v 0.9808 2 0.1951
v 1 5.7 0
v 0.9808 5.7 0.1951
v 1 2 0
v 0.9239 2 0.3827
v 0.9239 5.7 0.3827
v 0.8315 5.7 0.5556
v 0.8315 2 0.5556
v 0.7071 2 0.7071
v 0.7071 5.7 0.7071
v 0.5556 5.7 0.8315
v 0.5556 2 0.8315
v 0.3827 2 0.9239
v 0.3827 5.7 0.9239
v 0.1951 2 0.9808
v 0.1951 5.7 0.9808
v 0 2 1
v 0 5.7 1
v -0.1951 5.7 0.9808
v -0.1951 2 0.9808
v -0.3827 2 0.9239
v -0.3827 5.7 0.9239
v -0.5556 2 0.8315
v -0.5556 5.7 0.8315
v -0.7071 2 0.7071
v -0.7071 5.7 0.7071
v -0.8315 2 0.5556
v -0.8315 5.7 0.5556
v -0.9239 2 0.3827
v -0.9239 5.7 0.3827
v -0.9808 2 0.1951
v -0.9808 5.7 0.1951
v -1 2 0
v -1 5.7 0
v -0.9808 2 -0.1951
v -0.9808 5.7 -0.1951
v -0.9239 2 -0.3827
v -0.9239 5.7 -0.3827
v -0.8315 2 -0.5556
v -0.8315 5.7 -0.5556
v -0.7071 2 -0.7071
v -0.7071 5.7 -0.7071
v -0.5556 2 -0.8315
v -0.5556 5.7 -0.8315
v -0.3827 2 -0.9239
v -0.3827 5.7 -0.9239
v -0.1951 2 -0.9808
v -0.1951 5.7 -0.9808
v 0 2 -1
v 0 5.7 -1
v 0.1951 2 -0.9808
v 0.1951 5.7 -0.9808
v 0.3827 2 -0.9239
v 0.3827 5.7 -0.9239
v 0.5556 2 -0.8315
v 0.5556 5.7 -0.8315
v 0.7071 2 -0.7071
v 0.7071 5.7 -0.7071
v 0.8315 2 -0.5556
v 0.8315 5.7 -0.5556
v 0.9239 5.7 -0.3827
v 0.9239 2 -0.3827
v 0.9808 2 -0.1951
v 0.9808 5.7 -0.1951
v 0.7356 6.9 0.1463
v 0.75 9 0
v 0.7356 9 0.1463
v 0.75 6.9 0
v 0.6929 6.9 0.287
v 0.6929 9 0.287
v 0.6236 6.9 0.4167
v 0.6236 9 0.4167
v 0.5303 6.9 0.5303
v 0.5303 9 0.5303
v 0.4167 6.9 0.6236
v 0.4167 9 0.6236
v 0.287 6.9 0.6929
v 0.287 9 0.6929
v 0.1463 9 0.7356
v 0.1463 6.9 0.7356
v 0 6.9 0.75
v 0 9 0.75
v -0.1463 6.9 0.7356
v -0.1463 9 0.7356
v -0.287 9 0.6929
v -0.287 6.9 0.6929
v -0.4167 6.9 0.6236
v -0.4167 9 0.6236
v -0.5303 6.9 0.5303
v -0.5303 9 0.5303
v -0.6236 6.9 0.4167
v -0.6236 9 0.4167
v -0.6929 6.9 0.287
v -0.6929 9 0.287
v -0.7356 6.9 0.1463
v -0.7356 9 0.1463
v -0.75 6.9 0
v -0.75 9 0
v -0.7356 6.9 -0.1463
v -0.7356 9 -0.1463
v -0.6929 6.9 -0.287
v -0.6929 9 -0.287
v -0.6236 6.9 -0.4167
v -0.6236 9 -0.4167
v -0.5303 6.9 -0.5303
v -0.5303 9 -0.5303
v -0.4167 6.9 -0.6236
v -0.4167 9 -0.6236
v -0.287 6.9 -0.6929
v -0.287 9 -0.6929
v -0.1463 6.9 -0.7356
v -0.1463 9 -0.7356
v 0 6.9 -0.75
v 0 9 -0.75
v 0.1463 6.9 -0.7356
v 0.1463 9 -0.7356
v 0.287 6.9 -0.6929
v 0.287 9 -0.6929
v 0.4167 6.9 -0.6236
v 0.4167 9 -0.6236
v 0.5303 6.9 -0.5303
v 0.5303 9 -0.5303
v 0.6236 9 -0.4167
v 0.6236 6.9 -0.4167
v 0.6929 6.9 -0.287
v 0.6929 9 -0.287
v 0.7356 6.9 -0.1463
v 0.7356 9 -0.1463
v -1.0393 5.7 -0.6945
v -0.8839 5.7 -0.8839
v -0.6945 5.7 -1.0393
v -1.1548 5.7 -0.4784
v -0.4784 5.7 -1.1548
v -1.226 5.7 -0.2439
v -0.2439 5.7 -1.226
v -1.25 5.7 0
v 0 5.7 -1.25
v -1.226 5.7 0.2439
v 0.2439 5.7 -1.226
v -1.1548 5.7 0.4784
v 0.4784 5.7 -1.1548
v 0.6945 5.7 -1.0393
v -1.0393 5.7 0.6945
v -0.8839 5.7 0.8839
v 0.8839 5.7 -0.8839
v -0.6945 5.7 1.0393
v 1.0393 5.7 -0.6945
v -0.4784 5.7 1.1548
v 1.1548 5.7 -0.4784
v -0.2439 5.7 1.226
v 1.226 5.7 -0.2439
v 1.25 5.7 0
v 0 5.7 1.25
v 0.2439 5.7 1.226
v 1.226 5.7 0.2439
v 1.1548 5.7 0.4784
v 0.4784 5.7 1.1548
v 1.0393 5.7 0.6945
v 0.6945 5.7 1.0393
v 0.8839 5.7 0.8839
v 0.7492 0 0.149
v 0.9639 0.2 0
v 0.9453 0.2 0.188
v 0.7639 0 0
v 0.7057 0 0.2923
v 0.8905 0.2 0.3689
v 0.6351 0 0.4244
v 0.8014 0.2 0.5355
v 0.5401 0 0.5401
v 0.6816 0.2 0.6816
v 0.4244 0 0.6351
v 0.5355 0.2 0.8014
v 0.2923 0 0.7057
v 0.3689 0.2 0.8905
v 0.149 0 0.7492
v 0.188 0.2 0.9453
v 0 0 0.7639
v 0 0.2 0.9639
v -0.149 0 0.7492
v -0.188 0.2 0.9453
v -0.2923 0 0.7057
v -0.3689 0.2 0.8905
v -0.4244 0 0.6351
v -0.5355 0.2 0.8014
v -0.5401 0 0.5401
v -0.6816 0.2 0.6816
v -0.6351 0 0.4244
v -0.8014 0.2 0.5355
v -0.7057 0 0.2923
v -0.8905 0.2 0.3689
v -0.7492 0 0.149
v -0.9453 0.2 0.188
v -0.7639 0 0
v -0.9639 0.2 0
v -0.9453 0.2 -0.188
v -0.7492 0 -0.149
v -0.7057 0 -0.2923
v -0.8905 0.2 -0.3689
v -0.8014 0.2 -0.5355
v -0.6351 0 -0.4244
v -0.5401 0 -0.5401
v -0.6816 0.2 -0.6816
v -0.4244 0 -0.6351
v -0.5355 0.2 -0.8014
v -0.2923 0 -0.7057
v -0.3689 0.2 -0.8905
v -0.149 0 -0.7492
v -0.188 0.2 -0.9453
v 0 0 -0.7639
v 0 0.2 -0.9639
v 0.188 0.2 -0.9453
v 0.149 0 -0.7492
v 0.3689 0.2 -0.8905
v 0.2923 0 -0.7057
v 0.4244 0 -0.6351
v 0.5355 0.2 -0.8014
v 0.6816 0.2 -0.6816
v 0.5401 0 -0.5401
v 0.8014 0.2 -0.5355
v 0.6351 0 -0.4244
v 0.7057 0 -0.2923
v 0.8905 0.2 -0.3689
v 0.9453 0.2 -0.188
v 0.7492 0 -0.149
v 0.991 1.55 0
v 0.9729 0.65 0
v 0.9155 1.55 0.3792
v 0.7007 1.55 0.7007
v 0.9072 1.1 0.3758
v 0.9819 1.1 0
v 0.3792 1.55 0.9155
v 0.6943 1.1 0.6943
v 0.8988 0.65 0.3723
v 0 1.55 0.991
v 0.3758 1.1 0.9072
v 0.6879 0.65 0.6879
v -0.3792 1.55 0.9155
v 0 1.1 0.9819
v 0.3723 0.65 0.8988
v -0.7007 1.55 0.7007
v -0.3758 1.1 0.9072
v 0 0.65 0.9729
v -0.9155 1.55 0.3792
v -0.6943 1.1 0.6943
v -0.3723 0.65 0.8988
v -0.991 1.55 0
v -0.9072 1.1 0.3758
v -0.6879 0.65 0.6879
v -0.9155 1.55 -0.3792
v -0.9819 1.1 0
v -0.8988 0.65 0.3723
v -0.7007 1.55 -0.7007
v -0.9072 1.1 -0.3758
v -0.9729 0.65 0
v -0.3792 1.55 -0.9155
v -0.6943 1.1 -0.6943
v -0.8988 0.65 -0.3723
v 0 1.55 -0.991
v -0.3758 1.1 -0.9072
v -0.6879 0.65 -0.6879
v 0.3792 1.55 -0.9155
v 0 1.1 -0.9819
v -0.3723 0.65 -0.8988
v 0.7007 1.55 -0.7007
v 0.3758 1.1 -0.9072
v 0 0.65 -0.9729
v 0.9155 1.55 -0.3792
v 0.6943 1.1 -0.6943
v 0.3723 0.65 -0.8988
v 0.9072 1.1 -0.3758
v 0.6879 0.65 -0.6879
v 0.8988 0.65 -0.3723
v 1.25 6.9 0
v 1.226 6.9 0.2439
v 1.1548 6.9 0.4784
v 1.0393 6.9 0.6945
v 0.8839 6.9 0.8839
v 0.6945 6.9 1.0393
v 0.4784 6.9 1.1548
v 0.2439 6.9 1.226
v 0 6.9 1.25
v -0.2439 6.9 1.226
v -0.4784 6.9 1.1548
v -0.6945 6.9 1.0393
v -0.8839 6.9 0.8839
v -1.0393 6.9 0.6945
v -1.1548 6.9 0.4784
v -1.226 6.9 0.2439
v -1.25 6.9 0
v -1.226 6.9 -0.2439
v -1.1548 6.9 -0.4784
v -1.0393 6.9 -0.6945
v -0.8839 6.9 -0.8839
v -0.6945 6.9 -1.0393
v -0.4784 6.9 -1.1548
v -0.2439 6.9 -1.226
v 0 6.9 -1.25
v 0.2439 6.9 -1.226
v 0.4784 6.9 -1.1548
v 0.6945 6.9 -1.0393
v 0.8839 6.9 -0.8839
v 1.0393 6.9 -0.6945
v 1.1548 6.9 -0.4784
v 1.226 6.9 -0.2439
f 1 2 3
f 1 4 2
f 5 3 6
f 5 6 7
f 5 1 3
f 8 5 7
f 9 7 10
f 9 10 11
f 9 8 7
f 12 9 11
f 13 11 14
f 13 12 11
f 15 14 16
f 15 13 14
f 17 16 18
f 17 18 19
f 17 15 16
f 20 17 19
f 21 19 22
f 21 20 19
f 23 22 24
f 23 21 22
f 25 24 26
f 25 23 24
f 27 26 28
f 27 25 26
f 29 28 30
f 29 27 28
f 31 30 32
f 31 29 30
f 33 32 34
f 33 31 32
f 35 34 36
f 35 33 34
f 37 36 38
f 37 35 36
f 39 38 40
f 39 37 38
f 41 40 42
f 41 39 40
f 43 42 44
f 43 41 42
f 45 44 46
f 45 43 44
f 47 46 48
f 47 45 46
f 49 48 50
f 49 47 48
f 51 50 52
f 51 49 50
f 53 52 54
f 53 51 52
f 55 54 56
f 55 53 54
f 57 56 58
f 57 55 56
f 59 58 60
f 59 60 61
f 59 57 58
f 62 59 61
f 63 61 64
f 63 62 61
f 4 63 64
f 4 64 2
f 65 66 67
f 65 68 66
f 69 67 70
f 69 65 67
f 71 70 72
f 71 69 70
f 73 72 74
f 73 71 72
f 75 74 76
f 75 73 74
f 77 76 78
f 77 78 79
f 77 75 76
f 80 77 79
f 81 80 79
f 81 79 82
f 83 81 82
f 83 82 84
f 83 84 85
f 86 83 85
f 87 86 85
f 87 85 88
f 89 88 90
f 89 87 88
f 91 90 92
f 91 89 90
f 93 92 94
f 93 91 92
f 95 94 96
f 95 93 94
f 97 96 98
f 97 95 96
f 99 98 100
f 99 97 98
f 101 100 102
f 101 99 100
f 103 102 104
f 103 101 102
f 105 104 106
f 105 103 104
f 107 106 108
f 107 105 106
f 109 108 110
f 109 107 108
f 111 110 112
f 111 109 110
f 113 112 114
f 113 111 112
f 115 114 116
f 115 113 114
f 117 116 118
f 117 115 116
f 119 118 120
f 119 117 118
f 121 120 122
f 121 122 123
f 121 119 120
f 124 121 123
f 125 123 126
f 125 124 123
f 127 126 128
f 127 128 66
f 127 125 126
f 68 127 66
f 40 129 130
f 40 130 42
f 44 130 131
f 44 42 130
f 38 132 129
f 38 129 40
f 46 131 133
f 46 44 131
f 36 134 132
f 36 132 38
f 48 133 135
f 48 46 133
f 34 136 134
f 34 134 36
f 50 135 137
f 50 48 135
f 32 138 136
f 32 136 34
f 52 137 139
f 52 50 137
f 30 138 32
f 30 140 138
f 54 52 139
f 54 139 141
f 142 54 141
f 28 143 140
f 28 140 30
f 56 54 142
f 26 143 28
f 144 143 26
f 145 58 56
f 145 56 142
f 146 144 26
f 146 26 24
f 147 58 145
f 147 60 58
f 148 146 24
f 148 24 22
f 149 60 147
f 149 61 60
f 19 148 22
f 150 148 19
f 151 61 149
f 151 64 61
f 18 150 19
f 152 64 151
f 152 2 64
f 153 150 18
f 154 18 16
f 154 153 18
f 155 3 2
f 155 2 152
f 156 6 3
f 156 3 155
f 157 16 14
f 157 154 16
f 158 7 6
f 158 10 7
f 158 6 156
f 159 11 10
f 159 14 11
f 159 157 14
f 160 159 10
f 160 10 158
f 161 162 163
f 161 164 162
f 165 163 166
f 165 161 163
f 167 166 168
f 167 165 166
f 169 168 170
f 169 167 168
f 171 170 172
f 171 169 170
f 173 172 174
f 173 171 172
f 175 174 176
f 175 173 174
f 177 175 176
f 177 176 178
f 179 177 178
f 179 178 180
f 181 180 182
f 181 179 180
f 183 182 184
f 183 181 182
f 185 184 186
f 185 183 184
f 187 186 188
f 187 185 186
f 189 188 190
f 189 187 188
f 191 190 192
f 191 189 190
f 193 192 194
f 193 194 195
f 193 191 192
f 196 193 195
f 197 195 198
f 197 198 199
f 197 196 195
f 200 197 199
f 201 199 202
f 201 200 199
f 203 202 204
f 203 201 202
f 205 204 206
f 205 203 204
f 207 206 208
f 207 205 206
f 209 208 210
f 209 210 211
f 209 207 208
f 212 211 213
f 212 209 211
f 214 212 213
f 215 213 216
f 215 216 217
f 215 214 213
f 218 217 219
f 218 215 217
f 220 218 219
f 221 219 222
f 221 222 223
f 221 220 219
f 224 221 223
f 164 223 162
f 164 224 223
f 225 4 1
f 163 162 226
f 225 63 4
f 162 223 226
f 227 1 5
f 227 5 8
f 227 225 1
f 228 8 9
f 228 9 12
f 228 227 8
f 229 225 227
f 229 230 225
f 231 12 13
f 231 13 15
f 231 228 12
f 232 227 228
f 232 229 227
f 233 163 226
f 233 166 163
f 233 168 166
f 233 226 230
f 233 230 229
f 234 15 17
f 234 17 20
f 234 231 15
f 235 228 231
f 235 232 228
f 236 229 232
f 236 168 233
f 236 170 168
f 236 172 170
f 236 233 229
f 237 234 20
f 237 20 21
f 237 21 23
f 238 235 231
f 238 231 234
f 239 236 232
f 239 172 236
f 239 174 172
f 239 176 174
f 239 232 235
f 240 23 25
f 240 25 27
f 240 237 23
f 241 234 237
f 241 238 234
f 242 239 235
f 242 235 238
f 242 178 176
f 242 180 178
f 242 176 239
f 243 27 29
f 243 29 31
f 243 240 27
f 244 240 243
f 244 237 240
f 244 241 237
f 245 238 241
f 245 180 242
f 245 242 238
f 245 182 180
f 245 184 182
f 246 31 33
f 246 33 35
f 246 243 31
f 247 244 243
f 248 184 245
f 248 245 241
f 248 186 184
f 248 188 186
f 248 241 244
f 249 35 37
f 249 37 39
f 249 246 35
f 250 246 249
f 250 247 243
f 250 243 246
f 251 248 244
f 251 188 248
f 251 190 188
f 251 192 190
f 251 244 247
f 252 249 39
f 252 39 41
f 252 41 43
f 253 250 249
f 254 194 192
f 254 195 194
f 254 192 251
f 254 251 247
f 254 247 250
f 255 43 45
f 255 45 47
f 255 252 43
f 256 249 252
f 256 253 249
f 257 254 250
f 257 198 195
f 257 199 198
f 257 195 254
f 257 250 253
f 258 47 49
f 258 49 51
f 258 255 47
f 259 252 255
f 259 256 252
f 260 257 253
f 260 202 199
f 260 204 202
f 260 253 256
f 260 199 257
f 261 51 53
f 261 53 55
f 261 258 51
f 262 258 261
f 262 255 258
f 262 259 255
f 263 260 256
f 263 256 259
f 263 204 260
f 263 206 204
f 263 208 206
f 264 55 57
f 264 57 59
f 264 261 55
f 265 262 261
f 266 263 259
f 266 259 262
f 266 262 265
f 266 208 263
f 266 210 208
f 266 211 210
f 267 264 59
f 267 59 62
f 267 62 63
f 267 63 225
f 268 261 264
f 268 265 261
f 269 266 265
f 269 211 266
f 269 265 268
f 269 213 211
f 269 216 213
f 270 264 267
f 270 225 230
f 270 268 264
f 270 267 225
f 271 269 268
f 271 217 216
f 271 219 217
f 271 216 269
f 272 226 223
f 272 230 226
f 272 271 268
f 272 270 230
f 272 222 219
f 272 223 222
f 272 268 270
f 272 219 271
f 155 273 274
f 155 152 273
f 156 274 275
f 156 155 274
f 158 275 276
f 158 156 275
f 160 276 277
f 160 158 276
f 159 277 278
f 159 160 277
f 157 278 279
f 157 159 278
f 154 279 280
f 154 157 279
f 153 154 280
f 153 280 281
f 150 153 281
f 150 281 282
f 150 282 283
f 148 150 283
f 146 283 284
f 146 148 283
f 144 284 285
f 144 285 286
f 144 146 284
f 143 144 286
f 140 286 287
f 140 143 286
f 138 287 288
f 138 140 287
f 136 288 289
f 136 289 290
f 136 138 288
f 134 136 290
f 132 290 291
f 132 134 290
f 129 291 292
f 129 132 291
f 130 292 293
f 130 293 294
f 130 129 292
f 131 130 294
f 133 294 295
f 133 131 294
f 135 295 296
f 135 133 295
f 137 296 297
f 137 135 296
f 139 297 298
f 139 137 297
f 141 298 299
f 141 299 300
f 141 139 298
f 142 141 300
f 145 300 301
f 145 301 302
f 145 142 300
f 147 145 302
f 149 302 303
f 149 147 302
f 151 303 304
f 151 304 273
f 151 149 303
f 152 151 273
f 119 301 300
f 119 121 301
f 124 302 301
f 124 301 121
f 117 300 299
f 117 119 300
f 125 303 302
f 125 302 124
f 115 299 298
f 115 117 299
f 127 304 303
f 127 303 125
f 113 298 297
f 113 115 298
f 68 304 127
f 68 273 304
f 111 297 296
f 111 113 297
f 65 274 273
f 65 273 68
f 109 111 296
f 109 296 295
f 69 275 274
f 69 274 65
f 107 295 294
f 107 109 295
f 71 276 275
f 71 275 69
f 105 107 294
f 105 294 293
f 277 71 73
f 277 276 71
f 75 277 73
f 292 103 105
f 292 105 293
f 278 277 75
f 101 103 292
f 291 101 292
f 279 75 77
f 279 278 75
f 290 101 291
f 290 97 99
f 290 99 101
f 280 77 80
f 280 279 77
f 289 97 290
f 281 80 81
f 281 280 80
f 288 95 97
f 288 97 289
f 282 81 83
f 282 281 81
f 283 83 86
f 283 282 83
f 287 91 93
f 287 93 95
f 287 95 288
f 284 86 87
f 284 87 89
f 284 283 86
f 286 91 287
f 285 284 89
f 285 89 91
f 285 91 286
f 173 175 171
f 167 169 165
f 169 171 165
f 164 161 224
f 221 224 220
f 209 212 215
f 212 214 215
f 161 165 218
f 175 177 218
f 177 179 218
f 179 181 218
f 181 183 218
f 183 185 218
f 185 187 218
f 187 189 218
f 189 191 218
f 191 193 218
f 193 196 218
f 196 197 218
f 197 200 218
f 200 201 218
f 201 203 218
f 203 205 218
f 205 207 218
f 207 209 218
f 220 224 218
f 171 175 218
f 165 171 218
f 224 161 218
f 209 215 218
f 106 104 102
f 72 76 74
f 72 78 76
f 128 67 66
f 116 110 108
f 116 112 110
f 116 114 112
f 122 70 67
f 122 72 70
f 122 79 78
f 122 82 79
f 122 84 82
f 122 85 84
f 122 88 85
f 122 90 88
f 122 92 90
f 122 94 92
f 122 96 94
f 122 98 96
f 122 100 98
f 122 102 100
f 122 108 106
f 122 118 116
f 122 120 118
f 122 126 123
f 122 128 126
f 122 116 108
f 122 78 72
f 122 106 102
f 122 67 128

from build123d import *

# Parameters (mm, degrees)
SKETCH2_R           = 1.25
BOSS_EXTRUDE1_DEPTH = 9


with BuildPart() as part:
    # Sketch2 → Boss-Extrude1 (new body)
    with BuildSketch(Plane(origin=(0, 0, 0), x_dir=(1, 0, 0), z_dir=(0, 1, 0))):
        Circle(SKETCH2_R)
    extrude(amount=BOSS_EXTRUDE1_DEPTH)

    # Sketch4 → Cut-Revolve1 (revolve, cut)
    with BuildSketch(Plane.XY):
        Polygon((0.75, 9), (0.75, 6.9), (1.25, 6.9), (1.25, 5.7), (1, 5.7), (1, 2), (0.963866832, 0.2), (0.763866832, 0), (1.75, 0), (1.75, 9), align=None)
    revolve(axis=Axis((0, 9, 0), (0, -1, 0)), mode=Mode.SUBTRACT)


solid = part.part
